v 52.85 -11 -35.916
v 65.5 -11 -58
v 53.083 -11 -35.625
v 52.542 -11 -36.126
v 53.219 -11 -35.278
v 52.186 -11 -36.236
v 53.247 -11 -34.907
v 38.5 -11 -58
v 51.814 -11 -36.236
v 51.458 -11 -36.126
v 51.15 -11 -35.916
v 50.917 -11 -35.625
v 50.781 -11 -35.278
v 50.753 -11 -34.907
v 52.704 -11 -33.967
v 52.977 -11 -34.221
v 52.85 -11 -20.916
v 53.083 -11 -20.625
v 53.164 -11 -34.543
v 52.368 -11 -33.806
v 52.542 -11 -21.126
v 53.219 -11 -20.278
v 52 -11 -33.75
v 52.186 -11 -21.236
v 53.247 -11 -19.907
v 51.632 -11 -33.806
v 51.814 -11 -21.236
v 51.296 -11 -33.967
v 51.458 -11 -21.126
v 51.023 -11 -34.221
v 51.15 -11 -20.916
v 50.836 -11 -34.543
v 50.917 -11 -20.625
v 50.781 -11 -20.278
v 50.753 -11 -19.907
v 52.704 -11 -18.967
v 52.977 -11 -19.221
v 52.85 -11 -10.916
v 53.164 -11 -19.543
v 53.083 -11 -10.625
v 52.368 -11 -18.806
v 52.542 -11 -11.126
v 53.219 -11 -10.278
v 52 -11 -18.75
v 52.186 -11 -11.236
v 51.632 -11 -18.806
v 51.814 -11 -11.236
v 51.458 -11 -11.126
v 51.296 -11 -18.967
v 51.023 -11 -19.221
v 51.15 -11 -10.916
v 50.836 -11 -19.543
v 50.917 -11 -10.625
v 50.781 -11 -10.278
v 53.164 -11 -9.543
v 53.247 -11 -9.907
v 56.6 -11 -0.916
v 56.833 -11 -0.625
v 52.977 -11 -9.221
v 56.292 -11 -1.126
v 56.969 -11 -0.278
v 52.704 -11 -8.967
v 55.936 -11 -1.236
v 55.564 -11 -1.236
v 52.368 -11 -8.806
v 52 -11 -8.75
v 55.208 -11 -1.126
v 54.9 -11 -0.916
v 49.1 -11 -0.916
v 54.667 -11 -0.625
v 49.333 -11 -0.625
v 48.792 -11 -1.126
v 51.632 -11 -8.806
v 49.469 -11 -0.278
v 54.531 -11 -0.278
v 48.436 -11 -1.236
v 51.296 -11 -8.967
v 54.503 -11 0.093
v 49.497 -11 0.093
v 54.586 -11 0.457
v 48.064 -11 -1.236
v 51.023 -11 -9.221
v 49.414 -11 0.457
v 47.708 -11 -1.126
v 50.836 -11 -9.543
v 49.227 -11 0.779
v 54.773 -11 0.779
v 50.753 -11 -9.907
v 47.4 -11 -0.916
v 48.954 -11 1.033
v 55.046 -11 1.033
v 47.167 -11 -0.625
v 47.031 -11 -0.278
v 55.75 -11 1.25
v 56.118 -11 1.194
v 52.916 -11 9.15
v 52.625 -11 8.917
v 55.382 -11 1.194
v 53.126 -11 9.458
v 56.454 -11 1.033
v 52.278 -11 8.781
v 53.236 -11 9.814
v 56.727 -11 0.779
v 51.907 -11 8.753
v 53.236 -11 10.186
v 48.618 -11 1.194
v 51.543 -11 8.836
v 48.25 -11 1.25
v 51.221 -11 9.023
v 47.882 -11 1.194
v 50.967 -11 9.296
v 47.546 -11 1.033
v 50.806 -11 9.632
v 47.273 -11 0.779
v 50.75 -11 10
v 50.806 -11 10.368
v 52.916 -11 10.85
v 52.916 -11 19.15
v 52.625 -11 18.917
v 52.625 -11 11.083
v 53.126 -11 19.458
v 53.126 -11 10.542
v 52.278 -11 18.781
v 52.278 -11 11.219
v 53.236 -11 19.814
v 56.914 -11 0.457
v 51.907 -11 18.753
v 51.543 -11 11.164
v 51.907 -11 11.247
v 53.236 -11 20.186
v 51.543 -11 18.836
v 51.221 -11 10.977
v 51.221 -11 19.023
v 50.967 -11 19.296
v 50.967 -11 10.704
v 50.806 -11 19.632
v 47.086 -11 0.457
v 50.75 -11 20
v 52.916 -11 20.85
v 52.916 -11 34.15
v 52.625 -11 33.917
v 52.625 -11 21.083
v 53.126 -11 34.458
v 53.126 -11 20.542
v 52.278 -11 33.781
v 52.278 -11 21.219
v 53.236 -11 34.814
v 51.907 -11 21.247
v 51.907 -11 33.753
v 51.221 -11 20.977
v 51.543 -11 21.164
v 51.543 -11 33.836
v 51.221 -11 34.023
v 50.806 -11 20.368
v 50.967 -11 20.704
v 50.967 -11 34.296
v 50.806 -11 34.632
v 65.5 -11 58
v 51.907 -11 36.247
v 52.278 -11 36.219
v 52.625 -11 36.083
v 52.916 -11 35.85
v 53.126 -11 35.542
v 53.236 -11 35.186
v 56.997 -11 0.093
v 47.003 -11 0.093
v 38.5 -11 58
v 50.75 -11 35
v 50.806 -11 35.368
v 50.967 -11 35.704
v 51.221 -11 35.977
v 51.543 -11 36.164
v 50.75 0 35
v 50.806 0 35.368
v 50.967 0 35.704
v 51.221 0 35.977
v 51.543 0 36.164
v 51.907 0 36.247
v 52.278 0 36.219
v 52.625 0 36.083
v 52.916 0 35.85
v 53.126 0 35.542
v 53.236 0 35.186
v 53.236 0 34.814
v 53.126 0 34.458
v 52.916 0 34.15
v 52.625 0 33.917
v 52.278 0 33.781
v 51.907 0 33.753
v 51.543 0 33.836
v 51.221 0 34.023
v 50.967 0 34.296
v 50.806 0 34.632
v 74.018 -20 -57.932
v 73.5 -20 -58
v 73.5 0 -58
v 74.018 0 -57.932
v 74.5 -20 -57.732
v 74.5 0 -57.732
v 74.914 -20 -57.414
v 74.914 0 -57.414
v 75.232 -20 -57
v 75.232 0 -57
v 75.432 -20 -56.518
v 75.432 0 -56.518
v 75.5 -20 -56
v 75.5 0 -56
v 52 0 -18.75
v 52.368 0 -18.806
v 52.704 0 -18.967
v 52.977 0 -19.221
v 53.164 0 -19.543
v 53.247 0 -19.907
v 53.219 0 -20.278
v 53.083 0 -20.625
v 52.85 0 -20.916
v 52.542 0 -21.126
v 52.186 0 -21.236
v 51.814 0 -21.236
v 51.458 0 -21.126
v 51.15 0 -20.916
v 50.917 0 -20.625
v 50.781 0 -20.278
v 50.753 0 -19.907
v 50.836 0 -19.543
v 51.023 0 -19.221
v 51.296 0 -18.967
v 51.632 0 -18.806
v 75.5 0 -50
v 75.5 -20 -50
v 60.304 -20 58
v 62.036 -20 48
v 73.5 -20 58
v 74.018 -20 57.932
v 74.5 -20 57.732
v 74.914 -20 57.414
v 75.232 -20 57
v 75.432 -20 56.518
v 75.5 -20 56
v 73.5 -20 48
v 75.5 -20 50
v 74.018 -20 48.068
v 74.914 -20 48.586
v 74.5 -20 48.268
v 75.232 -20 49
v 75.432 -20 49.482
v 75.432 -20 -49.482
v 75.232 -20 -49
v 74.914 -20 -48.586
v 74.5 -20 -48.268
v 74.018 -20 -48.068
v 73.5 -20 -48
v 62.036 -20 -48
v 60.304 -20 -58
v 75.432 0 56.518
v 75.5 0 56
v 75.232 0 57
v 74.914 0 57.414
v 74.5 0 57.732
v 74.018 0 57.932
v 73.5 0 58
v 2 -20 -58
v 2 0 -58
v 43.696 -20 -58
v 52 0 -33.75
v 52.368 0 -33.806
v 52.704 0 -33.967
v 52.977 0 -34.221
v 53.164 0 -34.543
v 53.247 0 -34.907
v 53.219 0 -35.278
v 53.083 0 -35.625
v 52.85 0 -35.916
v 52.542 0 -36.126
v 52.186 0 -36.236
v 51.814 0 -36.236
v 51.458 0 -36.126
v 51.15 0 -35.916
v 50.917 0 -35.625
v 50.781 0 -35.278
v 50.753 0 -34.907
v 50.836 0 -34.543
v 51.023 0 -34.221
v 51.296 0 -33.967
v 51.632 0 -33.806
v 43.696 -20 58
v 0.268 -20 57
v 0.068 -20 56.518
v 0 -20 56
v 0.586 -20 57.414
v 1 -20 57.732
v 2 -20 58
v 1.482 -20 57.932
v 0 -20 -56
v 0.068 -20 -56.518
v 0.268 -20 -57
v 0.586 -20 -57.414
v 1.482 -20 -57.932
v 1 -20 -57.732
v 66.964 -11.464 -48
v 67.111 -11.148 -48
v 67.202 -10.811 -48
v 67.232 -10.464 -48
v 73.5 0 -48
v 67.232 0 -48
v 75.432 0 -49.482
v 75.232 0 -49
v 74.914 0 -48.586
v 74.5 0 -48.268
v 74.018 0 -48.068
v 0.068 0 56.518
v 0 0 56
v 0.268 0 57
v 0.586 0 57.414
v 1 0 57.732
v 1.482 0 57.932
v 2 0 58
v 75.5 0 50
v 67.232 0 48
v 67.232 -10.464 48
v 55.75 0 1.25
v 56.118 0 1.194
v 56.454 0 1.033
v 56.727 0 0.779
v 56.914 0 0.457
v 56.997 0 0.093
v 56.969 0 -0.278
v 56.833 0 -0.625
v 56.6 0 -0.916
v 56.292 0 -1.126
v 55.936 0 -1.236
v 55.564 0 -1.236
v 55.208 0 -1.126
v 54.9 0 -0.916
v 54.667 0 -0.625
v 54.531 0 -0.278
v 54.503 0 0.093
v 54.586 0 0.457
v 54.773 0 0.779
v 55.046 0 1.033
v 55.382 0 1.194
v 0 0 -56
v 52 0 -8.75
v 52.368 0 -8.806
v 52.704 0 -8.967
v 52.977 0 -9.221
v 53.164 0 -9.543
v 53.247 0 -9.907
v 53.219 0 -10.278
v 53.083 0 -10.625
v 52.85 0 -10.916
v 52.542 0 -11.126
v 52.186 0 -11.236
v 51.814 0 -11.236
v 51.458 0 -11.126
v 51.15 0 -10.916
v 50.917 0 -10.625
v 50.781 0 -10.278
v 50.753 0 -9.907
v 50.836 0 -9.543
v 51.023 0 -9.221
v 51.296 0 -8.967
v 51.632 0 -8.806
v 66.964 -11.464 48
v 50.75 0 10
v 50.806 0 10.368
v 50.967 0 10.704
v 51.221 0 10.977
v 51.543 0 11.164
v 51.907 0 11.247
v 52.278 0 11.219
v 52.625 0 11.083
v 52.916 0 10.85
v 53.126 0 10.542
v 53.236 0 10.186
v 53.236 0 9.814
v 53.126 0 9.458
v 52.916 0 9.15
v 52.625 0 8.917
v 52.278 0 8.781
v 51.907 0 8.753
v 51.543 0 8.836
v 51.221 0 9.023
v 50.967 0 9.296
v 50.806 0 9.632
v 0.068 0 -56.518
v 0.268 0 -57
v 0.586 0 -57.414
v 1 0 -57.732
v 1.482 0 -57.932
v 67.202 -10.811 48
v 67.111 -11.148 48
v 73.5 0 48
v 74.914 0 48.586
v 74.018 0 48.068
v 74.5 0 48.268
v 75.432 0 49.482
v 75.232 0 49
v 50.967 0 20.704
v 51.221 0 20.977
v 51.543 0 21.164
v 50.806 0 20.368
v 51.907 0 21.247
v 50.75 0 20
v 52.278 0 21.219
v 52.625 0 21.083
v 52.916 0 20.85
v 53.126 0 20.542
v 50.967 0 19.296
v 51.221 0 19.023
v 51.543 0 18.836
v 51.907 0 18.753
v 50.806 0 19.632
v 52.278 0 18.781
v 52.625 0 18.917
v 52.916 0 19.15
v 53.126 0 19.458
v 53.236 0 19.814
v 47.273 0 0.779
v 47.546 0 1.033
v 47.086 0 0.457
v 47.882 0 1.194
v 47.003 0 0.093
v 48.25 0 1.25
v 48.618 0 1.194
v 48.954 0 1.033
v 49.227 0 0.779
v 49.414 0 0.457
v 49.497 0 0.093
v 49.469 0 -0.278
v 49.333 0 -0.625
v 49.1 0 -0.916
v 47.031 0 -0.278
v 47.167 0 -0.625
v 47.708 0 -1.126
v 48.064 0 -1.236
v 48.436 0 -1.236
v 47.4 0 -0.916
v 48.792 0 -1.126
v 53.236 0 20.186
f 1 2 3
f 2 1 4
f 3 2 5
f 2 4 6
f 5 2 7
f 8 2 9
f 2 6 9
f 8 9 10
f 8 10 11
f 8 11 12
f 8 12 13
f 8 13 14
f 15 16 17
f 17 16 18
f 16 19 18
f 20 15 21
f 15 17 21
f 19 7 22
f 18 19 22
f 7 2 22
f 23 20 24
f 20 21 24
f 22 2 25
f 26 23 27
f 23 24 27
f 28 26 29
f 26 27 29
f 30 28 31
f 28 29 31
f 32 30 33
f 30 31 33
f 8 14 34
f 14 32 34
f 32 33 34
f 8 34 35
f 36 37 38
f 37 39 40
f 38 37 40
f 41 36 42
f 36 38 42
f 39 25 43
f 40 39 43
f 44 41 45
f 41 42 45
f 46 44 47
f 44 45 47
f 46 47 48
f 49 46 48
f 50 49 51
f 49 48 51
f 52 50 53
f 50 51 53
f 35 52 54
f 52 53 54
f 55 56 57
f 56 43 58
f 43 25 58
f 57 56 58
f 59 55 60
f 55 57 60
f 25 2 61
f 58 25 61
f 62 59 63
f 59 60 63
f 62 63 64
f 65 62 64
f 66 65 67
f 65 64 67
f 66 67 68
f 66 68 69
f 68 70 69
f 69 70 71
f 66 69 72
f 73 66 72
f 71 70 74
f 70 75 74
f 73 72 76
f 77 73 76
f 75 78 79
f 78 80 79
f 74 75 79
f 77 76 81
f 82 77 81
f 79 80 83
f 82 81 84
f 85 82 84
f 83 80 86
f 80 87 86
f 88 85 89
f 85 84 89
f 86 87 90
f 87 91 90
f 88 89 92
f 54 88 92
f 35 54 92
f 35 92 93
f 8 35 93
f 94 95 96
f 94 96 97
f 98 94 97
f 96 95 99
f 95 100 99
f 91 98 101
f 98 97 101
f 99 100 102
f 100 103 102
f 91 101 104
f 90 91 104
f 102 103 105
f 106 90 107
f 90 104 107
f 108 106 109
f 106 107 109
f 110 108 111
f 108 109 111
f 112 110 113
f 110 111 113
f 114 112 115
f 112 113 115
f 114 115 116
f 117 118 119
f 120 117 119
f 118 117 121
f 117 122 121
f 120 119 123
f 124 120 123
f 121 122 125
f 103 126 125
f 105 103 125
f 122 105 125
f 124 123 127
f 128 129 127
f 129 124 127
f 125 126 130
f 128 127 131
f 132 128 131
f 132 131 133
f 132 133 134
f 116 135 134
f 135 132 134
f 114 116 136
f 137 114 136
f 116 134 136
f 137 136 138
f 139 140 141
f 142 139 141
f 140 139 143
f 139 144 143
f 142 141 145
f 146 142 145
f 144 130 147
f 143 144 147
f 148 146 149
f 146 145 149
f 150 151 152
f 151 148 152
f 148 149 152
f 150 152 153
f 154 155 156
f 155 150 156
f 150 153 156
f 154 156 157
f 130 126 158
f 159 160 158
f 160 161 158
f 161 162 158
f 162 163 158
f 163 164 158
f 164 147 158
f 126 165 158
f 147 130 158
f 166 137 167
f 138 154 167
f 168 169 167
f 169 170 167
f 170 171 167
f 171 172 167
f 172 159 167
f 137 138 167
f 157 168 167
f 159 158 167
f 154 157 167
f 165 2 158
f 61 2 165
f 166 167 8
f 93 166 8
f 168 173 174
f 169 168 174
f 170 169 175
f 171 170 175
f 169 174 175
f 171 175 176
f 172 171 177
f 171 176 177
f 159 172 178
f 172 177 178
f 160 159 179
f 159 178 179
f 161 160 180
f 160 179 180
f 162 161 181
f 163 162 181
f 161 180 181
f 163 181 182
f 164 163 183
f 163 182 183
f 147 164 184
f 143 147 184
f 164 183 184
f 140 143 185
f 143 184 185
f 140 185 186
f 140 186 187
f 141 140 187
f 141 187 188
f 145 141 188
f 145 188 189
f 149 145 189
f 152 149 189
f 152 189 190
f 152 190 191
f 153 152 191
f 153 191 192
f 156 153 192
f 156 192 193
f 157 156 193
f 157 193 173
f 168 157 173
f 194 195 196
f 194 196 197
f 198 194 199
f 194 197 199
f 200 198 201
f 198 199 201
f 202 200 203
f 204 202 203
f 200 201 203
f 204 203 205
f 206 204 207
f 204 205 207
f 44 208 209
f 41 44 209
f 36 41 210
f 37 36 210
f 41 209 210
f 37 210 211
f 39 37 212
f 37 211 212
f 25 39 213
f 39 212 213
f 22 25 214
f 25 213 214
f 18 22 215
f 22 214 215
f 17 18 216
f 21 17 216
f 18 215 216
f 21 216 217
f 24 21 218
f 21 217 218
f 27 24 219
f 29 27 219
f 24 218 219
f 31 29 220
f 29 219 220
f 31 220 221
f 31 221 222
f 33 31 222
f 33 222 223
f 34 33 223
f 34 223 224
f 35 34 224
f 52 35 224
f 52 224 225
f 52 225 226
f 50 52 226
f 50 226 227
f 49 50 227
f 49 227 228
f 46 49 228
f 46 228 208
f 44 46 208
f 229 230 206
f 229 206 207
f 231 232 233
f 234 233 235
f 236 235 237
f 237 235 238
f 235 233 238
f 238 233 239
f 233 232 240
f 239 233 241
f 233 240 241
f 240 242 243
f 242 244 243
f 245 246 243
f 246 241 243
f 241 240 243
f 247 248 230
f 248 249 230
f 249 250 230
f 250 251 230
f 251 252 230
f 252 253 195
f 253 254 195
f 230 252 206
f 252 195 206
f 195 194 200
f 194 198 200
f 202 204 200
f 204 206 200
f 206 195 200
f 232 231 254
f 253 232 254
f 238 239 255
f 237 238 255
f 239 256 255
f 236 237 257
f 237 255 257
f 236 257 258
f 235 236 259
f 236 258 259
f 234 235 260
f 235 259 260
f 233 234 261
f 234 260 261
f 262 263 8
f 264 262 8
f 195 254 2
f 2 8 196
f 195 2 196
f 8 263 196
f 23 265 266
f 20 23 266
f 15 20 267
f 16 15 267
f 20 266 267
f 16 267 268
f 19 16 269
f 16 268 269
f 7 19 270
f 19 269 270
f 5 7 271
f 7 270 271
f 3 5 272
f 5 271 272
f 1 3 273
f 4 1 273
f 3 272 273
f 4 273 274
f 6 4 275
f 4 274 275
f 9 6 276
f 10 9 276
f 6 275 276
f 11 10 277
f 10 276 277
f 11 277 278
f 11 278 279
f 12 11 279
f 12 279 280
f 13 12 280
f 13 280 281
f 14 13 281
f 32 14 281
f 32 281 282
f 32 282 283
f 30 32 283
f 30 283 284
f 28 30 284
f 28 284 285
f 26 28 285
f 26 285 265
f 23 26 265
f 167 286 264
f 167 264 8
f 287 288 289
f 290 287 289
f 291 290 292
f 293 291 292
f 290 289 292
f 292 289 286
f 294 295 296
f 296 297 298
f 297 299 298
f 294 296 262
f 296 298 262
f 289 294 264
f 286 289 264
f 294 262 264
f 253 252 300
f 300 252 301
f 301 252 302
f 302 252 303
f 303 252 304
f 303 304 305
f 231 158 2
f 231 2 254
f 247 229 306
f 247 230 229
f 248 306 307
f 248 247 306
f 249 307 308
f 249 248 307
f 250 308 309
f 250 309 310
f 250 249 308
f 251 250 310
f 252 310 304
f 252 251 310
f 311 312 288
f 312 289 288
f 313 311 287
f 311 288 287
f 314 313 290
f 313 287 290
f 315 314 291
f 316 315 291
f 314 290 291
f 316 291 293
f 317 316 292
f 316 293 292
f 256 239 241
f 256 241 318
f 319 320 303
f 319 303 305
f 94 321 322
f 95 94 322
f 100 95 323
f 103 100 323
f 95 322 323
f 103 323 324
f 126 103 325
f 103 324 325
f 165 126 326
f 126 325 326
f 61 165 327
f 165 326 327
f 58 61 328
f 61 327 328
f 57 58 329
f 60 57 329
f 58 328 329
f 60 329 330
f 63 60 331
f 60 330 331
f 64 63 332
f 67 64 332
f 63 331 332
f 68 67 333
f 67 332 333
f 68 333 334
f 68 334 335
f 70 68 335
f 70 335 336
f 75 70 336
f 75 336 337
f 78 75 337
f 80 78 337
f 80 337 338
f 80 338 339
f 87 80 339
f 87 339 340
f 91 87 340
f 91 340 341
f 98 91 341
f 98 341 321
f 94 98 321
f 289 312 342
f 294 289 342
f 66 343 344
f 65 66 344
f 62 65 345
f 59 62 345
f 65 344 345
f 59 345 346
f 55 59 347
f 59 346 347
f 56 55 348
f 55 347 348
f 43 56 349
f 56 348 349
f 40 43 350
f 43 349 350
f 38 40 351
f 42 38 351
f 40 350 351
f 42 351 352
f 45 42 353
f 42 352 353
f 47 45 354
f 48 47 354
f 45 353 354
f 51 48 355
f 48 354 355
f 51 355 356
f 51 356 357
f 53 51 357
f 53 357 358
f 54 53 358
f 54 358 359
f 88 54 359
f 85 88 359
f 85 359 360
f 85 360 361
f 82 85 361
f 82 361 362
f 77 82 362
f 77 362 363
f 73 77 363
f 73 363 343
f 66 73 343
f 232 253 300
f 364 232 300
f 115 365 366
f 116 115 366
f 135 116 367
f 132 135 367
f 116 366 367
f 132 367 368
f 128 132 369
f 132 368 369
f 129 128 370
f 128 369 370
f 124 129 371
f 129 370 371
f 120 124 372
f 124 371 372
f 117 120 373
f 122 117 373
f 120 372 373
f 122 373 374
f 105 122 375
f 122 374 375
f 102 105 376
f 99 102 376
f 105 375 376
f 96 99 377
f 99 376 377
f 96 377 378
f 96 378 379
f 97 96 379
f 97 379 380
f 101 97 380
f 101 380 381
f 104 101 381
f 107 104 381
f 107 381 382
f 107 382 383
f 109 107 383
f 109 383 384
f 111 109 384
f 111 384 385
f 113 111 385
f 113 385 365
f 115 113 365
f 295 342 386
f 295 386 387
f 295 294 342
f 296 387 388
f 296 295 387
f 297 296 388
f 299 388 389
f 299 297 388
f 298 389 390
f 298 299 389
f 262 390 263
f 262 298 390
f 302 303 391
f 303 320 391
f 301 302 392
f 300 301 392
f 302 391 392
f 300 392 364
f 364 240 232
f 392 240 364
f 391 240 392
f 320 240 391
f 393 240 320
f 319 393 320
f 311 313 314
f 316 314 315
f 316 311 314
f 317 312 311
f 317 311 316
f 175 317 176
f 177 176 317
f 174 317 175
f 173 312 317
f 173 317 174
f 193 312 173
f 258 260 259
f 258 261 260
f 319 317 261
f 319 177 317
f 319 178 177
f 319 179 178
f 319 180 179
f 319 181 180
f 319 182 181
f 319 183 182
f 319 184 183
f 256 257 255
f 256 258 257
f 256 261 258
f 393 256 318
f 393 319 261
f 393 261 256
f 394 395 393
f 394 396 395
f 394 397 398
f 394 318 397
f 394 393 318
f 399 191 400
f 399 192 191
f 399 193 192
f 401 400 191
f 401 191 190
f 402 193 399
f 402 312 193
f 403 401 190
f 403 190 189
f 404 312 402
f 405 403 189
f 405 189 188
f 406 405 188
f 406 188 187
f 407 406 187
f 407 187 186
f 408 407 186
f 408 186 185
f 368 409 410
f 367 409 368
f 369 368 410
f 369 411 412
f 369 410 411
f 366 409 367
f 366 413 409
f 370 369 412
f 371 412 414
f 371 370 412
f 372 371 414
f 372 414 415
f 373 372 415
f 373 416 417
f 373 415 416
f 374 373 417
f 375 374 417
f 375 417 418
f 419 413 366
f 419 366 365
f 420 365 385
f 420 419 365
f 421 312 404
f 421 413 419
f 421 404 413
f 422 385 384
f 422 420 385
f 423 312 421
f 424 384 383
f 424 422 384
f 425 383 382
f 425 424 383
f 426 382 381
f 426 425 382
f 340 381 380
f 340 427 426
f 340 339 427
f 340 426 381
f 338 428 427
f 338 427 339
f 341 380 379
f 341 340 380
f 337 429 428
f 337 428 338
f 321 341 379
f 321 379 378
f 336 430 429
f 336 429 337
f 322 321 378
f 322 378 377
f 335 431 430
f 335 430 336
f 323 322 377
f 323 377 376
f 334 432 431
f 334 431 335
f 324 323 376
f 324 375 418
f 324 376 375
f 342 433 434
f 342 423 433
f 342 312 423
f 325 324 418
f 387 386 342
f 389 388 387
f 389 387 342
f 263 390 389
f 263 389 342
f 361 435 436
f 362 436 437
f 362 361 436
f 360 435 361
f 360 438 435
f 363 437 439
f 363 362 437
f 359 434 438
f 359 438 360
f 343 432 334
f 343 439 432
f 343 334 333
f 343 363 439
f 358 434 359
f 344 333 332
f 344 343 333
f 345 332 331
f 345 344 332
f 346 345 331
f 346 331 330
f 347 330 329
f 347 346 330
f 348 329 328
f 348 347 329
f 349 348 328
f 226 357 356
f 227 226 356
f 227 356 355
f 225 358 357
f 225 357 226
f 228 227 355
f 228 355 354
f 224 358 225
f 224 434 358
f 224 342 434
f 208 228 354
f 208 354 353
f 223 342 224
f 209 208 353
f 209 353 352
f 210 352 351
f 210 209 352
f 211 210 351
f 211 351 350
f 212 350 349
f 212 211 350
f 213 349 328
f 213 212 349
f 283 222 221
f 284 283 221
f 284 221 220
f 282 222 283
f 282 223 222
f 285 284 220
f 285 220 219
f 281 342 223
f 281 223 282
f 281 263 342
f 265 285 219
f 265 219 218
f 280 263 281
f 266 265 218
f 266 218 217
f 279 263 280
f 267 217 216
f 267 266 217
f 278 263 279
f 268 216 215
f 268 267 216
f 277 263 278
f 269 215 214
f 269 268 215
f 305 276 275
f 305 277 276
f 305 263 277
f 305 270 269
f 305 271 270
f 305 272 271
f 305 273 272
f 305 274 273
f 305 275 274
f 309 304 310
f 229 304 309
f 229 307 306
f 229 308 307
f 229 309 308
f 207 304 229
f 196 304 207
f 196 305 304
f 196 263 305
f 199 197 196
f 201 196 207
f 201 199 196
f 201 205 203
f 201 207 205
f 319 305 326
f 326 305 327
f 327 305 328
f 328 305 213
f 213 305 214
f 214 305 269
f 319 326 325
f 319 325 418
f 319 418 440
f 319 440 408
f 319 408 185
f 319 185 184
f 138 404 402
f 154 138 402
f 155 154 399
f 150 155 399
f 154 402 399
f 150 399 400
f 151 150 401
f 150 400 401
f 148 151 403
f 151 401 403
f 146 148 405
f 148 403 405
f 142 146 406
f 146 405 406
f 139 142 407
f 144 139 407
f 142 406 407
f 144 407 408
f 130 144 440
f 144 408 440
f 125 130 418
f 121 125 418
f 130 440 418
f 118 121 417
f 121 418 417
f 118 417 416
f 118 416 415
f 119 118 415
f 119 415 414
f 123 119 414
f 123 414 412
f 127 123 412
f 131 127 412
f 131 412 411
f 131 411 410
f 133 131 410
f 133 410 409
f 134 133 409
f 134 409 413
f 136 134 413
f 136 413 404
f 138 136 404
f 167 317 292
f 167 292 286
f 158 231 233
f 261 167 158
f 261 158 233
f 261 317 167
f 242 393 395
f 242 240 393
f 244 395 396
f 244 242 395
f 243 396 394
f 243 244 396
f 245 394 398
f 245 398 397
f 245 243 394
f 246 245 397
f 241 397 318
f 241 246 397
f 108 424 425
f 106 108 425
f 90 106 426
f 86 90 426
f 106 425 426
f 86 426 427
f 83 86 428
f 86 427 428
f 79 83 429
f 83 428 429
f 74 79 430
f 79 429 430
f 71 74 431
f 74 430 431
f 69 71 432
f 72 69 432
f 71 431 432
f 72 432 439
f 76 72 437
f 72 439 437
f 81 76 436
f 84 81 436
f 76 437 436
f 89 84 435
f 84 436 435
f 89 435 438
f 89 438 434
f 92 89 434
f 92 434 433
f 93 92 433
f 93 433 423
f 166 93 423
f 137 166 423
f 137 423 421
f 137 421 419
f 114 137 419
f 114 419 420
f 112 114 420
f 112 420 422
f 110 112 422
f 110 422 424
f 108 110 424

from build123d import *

# Parameters (mm, degrees)
SKETCH1_W           = 100
SKETCH1_H           = 116
SKETCH1_R           = 2.2
BOSS_EXTRUDE2_DEPTH = 20
FILLET2_R           = 2
CUT_EXTRUDE7_DEPTH  = 155.45387661
SKETCH22_R          = 1.25
CUT_EXTRUDE12_DEPTH = 118.320075008
CUT_EXTRUDE13_START = -10
CUT_EXTRUDE13_DEPTH = 96
SKETCH26_W          = 24.5
SKETCH26_H          = 20
CUT_EXTRUDE14_DEPTH = 155.45387661
FILLET11_R          = 2


with BuildPart() as part:
    # Sketch1 → Boss-Extrude2 (new body)
    # profile 1 of 5: a face of its own
    with BuildSketch(Plane(origin=(0, 0, 0), x_dir=(1, 0, 0), z_dir=(0, 1, 0))):
        with Locations((50, 0)):
            Rectangle(SKETCH1_W, SKETCH1_H)
        with Locations((97.5, 35)):
            Circle(SKETCH1_R, mode=Mode.SUBTRACT)
        with Locations((97.5, -35)):
            Circle(SKETCH1_R, mode=Mode.SUBTRACT)
        with Locations((75, 35)):
            Circle(SKETCH1_R, mode=Mode.SUBTRACT)
        with Locations((75, -35)):
            Circle(SKETCH1_R, mode=Mode.SUBTRACT)
    # profile 2 of 5: a face of its own
    with BuildSketch(Plane(origin=(0, 0, 0), x_dir=(1, 0, 0), z_dir=(0, 1, 0))):
        with Locations((75, -35)):
            Circle(SKETCH1_R)
    # profile 3 of 5: a face of its own
    with BuildSketch(Plane(origin=(0, 0, 0), x_dir=(1, 0, 0), z_dir=(0, 1, 0))):
        with Locations((97.5, -35)):
            Circle(SKETCH1_R)
    # profile 4 of 5: a face of its own
    with BuildSketch(Plane(origin=(0, 0, 0), x_dir=(1, 0, 0), z_dir=(0, 1, 0))):
        with Locations((75, 35)):
            Circle(SKETCH1_R)
    # profile 5 of 5: a face of its own
    with BuildSketch(Plane(origin=(0, 0, 0), x_dir=(1, 0, 0), z_dir=(0, 1, 0))):
        with Locations((97.5, 35)):
            Circle(SKETCH1_R)
    extrude(amount=-BOSS_EXTRUDE2_DEPTH)

    # Fillet2
    fillet2_edges = [part.edges().sort_by_distance(p)[0] for p in [
        (100, -10, -58),
        (100, -10, 58),
        (0, -10, 58),
        (0, -10, -58),
    ]]
    fillet(fillet2_edges, radius=FILLET2_R)

    # Sketch8 → Cut-Extrude7 (cut, through all)
    with BuildSketch(Plane.XY.offset(58)):
        Polygon((38.788675135, -11), (44.562177826, -11), (59.437822174, -11), (65.211324865, -11), (65.5, -11), (59.437822174, -21.5), (44.562177826, -21.5), (38.5, -11), align=None)
    extrude(amount=-CUT_EXTRUDE7_DEPTH, mode=Mode.SUBTRACT)

    # Sketch22 → Cut-Extrude12 (cut, through all)
    with BuildSketch(Plane(origin=(0, 0, 0), x_dir=(1, 0, 0), z_dir=(0, 1, 0))):
        with Locations(Location((48.25, 0, 0), (0, 0, 270))):
            Circle(SKETCH22_R)
        with Locations(Location((55.75, 0, 0), (0, 0, 270))):
            Circle(SKETCH22_R)
        with Locations(Location((52, 10, 0), (0, 0, 270))):
            Circle(SKETCH22_R)
        with Locations(Location((52, 20, 0), (0, 0, 270))):
            Circle(SKETCH22_R)
        with Locations(Location((52, 35, 0), (0, 0, 270))):
            Circle(SKETCH22_R)
        with Locations(Location((52, -35, 0), (0, 0, 180))):
            Circle(SKETCH22_R)
        with Locations(Location((52, -20, 0), (0, 0, 180))):
            Circle(SKETCH22_R)
        with Locations(Location((52, -10, 0), (0, 0, 180))):
            Circle(SKETCH22_R)
    extrude(amount=-CUT_EXTRUDE12_DEPTH, mode=Mode.SUBTRACT)

    # Sketch24 → Cut-Extrude13 (cut)
    with BuildSketch(Plane(origin=(0, 0, -58), x_dir=(-1, 0, 0), z_dir=(0, 0, -1)).offset(CUT_EXTRUDE13_START)):
        Polygon((-62.035898385, -20), (-67.232050808, -11), (-67.232050808, 0), (-100, 0), (-100, -20), align=None)
    extrude(amount=-CUT_EXTRUDE13_DEPTH, mode=Mode.SUBTRACT)

    # Sketch26 → Cut-Extrude14 (cut, through all)
    with BuildSketch(Plane.XY.offset(58)):
        with Locations((87.75, -10)):
            Rectangle(SKETCH26_W, SKETCH26_H)
    extrude(amount=-CUT_EXTRUDE14_DEPTH, mode=Mode.SUBTRACT)

    # Fillet11
    fillet11_edges = [part.edges().sort_by_distance(p)[0] for p in [
        (67.232050808, -11, 0),
        (75.5, -10, 48),
        (75.5, -10, 58),
        (75.5, -10, -48),
        (75.5, -10, -58),
    ]]
    fillet(fillet11_edges, radius=FILLET11_R)


solid = part.part
